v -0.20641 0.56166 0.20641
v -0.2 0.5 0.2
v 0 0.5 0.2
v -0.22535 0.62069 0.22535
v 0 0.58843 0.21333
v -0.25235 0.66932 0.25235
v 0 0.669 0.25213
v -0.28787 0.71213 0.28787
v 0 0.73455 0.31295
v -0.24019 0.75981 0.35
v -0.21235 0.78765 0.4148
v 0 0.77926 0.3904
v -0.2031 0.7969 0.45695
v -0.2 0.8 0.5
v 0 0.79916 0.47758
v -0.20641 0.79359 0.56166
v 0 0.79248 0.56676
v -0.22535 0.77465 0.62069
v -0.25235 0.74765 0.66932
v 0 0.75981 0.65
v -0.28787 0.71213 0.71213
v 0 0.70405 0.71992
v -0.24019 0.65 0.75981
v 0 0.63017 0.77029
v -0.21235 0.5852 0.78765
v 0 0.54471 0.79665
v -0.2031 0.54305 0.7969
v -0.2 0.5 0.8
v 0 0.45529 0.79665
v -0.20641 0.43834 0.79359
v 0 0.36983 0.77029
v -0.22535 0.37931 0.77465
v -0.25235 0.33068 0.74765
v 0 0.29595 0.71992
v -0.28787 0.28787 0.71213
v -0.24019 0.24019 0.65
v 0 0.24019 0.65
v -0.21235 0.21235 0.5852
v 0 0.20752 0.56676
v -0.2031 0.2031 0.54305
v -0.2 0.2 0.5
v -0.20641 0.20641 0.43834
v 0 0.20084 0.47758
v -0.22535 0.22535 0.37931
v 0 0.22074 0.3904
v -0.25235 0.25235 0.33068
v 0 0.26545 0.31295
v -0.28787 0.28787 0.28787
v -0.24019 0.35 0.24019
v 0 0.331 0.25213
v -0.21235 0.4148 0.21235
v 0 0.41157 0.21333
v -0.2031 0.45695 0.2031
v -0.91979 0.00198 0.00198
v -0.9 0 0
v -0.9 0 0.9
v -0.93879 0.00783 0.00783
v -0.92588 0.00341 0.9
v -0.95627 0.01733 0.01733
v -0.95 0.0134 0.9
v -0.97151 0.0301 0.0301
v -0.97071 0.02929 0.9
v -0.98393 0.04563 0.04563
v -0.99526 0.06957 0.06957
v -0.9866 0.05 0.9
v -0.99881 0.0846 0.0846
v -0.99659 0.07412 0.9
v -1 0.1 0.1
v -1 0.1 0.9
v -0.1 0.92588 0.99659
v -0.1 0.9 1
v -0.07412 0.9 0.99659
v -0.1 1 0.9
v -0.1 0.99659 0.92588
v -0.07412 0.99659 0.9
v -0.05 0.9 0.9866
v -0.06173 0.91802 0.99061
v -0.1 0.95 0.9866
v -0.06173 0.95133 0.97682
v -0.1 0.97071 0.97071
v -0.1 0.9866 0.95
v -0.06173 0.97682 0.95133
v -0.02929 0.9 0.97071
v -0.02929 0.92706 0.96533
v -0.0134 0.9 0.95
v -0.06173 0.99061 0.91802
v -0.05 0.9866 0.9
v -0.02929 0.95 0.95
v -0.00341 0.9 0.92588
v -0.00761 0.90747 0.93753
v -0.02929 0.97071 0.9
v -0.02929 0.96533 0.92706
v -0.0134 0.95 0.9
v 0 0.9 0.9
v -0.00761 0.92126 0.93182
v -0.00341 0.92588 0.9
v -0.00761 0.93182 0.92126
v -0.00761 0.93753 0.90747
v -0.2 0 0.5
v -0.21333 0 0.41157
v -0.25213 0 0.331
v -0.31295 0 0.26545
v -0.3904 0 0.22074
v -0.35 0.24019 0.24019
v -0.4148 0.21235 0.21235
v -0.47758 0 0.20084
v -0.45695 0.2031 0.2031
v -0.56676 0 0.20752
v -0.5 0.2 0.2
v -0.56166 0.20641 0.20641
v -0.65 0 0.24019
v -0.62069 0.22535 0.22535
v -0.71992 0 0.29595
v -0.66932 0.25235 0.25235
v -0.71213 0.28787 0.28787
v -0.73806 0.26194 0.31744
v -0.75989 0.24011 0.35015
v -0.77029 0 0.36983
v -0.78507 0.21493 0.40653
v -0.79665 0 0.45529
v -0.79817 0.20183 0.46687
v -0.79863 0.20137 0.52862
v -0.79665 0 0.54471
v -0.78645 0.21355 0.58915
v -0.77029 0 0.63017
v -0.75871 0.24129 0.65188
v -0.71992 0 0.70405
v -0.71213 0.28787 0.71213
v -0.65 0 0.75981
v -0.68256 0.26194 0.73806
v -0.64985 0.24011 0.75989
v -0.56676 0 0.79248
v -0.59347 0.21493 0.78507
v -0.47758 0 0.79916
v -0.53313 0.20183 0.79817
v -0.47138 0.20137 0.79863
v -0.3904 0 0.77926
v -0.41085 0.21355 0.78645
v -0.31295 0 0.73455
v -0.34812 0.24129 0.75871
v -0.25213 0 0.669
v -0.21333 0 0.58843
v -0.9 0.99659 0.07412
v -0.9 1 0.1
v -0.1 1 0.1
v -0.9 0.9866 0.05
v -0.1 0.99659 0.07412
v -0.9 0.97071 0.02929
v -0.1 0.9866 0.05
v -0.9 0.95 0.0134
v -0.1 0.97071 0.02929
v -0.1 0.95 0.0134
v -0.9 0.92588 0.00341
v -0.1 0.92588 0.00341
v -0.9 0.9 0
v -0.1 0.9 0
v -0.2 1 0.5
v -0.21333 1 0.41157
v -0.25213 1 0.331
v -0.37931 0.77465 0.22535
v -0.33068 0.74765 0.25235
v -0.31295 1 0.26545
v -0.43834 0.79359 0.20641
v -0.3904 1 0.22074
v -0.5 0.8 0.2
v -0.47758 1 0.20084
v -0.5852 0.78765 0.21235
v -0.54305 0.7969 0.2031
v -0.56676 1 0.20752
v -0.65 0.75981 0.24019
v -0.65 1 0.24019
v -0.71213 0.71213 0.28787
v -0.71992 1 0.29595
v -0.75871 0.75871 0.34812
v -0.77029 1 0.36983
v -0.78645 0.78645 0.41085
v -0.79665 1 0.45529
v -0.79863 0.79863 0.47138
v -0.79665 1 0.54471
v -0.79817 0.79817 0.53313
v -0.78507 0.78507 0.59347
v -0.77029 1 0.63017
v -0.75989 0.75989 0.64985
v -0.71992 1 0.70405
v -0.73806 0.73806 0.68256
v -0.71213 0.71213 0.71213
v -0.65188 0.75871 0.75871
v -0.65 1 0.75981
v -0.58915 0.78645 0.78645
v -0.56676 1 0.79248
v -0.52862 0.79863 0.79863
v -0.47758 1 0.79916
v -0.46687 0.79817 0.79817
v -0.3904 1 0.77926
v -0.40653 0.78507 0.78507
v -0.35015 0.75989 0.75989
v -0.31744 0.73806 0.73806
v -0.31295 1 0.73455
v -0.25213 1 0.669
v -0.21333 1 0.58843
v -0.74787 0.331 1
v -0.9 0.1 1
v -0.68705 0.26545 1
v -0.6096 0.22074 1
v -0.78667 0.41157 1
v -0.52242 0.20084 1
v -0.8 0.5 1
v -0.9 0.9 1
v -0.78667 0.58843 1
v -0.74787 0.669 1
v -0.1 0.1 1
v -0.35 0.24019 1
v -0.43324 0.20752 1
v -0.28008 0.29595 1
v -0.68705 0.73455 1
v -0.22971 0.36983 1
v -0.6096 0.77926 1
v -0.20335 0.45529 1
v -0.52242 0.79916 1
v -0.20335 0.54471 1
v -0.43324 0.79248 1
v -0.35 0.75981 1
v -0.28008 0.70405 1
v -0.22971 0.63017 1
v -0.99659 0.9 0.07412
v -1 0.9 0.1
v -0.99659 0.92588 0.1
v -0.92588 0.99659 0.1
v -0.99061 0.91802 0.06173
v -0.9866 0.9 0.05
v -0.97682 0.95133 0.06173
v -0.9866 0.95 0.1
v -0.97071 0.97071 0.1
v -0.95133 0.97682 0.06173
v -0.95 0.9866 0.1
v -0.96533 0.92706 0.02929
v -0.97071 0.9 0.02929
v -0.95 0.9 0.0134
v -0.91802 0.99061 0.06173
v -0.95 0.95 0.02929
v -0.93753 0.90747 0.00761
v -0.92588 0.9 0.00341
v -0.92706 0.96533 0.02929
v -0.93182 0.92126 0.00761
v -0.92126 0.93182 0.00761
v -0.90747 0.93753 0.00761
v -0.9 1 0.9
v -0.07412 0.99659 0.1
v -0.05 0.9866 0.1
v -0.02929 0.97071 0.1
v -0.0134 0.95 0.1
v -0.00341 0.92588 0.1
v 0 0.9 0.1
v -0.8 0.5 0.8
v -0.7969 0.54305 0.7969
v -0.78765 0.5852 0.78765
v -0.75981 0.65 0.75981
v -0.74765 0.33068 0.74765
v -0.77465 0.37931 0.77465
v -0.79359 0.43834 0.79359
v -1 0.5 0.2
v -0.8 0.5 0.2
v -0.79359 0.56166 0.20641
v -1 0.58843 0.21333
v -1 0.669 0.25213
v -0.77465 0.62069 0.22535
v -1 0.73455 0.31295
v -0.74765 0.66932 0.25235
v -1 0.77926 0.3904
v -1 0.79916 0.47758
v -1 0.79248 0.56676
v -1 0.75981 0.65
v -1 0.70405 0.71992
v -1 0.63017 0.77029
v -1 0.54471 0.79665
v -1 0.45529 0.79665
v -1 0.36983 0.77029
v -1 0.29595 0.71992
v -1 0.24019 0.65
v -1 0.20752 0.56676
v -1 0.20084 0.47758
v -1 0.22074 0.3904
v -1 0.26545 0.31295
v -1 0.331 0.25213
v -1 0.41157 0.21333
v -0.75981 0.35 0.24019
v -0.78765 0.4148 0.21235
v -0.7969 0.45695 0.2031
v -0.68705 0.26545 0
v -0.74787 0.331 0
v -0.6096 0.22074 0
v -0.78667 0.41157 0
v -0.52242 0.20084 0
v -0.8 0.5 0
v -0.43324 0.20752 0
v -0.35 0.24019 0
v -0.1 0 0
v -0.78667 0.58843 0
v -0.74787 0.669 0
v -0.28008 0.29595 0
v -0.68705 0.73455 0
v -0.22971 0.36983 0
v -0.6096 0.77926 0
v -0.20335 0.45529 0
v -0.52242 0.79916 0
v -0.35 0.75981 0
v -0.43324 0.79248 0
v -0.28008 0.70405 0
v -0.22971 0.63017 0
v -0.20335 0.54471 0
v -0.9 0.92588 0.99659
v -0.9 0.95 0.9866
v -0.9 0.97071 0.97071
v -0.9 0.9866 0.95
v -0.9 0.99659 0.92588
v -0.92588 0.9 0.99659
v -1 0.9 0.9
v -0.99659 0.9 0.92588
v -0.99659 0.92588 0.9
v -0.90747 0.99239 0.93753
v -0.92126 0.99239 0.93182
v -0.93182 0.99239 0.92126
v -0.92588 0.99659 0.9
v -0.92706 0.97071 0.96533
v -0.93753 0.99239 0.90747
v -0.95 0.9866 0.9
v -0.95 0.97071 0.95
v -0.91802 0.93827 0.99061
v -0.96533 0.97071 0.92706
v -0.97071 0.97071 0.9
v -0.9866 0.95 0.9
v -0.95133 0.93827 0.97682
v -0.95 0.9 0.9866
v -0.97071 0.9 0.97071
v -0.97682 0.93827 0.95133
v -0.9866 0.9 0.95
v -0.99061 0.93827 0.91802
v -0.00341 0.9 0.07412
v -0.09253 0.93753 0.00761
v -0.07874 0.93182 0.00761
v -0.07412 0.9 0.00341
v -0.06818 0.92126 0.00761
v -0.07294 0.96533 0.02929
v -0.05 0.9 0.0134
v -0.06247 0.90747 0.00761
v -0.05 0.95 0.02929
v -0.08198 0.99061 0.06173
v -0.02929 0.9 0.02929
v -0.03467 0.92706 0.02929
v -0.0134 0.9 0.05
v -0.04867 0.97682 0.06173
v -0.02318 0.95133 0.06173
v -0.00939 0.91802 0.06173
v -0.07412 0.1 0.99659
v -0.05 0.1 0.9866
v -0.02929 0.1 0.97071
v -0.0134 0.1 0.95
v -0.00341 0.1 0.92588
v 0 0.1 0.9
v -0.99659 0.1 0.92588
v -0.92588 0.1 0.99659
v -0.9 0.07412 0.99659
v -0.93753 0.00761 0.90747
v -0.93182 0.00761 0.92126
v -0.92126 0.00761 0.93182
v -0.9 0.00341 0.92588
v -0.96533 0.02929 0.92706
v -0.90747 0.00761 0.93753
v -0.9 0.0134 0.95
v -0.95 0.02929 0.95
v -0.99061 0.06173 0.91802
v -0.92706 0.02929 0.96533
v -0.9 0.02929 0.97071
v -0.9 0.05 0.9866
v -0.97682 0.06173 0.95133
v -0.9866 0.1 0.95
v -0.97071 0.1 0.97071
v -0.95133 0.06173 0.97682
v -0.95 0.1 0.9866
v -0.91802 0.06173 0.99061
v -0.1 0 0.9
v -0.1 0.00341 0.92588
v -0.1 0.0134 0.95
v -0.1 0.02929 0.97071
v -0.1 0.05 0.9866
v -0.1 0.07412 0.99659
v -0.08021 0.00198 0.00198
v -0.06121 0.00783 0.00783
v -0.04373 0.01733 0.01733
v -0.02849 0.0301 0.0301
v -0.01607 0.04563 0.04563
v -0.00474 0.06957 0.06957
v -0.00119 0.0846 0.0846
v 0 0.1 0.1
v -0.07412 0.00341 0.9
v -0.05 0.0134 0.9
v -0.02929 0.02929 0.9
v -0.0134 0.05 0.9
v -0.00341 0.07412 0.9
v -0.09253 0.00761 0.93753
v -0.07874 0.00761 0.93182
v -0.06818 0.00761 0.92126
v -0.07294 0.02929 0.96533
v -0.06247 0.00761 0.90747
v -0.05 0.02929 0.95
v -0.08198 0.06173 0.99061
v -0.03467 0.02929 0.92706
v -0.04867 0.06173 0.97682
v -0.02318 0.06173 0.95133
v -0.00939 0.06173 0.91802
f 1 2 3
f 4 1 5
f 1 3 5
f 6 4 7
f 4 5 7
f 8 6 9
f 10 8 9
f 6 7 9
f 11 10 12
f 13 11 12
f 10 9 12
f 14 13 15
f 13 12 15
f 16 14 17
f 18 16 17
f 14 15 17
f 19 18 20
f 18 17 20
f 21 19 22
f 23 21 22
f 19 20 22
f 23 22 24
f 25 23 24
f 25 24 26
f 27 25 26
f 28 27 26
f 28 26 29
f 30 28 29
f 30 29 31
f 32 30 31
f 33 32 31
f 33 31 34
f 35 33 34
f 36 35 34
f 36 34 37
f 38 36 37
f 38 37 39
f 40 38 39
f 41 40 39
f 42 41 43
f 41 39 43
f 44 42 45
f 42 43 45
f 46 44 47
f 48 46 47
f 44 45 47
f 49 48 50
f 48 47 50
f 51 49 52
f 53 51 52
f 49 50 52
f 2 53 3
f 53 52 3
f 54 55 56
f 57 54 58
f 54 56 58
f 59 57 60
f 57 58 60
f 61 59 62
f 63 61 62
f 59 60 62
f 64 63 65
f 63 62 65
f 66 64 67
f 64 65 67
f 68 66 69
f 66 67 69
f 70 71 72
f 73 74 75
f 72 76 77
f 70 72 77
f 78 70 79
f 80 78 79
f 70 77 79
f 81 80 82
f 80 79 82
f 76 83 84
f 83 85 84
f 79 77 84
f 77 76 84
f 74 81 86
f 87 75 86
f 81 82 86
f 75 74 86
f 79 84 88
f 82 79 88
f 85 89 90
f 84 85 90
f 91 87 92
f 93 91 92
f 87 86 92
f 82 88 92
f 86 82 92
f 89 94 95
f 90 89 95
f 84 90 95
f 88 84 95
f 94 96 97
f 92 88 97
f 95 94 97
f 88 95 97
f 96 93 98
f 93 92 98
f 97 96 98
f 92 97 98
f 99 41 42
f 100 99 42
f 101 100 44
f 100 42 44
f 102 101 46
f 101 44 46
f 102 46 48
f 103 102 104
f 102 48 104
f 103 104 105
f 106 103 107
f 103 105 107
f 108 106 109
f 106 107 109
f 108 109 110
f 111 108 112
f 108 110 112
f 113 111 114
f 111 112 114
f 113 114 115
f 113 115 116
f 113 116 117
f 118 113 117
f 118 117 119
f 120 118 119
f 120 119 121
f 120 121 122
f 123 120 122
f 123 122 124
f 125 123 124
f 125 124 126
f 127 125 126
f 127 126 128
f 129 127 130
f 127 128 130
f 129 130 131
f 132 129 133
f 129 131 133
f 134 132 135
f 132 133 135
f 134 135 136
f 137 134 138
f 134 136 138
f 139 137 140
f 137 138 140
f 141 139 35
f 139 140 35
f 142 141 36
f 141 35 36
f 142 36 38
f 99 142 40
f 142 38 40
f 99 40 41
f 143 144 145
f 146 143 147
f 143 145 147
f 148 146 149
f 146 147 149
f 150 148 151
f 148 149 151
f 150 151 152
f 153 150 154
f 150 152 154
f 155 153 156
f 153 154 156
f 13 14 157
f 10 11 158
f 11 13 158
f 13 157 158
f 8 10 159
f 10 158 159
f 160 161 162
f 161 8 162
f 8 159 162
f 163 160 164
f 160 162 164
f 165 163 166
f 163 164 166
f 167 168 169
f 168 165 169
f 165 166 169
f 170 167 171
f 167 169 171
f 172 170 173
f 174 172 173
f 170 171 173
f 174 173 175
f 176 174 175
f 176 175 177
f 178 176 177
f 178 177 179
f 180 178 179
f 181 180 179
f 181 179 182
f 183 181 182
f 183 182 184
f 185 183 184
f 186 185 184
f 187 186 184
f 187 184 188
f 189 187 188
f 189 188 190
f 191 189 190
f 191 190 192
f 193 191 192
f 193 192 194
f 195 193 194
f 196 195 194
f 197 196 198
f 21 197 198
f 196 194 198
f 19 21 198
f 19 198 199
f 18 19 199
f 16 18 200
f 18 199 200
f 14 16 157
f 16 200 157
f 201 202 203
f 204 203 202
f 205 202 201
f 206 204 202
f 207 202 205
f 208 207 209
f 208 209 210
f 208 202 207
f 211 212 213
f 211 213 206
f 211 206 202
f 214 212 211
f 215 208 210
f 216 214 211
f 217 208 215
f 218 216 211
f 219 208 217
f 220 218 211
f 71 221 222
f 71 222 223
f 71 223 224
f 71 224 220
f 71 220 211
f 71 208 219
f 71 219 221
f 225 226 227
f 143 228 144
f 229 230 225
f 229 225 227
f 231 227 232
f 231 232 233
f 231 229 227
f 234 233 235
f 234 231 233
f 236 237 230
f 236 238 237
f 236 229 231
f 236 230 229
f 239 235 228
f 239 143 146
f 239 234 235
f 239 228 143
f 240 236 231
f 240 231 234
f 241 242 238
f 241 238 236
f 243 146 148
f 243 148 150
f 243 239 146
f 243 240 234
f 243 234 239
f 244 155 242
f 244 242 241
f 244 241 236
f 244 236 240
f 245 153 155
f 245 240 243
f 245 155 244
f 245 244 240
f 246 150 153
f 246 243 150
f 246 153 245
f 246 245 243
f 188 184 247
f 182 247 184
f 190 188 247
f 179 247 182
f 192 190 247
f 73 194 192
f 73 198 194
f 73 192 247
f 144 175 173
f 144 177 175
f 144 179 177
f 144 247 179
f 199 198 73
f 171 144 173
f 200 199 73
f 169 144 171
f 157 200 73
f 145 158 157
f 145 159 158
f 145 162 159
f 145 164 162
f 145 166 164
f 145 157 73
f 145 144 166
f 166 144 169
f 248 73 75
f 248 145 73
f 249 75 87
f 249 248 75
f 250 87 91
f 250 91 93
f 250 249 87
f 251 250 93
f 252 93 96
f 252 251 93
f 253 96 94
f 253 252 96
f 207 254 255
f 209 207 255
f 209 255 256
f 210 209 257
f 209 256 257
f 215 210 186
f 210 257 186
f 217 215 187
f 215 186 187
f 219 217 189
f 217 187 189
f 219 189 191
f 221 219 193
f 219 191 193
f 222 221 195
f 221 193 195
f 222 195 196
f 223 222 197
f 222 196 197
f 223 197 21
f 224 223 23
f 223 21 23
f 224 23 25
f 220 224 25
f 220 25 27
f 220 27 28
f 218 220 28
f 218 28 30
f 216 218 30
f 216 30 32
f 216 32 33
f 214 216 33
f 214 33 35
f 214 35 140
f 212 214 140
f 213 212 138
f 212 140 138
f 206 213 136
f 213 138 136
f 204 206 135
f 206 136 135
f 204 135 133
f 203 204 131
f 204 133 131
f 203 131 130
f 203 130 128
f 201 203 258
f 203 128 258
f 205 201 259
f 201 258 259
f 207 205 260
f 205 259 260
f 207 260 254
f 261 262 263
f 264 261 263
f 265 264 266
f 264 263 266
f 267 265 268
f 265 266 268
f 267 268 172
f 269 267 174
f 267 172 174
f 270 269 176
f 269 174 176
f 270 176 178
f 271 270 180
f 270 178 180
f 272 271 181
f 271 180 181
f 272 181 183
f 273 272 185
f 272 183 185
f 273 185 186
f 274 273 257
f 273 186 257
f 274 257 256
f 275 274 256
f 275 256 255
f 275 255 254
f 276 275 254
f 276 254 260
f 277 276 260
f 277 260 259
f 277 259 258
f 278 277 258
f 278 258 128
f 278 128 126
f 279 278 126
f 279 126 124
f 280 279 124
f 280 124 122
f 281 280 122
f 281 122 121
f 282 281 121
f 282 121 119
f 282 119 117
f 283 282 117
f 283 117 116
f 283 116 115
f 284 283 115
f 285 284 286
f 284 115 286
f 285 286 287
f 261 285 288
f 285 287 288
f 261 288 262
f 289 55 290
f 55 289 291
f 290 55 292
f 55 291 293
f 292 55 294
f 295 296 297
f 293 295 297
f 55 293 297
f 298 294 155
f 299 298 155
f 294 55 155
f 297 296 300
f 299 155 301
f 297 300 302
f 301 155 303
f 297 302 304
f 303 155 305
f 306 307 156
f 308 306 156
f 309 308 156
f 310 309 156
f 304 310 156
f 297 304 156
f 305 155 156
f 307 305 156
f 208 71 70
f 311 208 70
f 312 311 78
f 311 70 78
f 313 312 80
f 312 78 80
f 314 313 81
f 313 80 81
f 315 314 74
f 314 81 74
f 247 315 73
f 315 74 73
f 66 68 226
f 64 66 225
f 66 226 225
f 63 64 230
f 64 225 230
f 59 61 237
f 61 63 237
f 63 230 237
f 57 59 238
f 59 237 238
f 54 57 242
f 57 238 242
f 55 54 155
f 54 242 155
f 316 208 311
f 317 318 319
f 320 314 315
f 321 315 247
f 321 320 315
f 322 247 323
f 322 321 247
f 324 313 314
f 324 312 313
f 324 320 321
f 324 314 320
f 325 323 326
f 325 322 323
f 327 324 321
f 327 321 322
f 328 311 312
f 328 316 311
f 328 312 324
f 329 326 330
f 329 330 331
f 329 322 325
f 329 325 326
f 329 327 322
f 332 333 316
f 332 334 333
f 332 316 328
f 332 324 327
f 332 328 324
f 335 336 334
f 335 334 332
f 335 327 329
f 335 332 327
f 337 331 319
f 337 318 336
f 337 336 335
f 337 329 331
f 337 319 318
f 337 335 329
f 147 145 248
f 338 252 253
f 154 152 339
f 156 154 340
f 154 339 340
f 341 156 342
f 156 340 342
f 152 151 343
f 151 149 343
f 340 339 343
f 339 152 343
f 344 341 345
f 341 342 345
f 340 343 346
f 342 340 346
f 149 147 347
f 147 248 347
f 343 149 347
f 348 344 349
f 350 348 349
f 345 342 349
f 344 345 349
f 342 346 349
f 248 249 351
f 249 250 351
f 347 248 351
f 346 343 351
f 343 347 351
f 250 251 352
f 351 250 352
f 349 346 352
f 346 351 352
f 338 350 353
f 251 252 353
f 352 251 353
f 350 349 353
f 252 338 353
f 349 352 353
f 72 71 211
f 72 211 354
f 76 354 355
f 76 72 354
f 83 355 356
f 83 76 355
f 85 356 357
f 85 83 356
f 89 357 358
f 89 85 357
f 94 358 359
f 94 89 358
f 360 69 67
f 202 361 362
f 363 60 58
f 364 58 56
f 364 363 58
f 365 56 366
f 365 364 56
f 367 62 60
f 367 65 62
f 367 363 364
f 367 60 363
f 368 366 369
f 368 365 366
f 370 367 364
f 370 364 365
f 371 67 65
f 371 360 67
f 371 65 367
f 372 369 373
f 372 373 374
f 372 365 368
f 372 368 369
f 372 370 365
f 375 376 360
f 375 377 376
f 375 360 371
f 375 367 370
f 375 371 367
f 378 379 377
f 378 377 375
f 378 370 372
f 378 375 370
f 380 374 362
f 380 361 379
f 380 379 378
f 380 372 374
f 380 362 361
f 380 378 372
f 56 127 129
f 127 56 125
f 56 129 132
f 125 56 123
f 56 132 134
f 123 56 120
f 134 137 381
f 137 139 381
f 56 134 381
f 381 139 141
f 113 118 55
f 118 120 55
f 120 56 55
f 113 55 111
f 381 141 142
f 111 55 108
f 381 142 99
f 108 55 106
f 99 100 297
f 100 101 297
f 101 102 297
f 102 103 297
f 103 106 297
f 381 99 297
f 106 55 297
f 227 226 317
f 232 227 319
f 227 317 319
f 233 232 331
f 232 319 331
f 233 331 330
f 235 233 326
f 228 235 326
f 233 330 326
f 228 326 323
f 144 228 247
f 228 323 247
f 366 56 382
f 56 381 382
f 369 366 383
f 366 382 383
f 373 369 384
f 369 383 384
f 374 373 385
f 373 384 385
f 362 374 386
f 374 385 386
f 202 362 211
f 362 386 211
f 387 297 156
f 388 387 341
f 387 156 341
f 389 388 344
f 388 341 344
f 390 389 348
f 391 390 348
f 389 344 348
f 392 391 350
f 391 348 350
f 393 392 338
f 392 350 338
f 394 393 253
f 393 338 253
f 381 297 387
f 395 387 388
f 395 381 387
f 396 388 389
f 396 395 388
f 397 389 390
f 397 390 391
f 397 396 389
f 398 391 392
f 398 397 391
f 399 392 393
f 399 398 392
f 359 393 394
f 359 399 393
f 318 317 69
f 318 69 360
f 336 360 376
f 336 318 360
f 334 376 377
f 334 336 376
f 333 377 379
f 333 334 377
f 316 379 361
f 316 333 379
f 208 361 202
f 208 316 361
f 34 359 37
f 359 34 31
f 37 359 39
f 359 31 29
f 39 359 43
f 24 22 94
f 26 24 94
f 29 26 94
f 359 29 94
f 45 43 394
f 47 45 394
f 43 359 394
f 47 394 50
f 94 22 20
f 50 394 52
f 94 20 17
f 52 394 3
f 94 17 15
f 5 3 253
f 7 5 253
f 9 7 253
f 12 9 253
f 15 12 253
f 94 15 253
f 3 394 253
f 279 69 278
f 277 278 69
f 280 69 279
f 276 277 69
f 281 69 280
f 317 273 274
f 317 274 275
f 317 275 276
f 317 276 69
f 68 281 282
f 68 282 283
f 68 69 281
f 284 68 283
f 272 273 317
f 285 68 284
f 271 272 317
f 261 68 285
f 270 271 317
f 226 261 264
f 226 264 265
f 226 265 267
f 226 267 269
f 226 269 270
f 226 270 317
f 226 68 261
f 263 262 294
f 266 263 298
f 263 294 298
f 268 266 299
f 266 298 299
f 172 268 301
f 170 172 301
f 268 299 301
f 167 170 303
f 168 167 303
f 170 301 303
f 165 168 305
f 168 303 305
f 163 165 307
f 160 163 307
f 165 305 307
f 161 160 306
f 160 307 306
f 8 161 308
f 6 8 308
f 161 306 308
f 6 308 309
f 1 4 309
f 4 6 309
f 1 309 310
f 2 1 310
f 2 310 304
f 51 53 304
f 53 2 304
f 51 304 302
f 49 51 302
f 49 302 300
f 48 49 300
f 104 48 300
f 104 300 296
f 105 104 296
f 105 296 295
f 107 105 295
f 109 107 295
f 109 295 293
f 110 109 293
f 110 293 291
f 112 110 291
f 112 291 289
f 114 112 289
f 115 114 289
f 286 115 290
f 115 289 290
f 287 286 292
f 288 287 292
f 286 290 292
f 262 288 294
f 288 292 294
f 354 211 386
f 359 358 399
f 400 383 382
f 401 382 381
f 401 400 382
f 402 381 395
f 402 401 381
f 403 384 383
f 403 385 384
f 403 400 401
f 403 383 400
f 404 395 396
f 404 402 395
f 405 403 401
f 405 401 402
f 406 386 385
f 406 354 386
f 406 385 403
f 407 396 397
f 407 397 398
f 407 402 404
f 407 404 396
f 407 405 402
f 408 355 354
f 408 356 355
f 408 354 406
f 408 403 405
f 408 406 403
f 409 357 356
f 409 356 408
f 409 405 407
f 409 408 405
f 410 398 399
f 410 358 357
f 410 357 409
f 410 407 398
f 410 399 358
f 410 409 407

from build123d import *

# Parameters (mm, degrees)
ESQUISSE1_W             = 1
ESQUISSE1_H             = 1
BOSS_EXTRU_1_DEPTH      = 1
ESQUISSE2_R             = 0.3
ENL_V_MAT_EXTRU_1_DEPTH = 1
ESQUISSE4_R             = 0.3
ENL_V_MAT_EXTRU_2_DEPTH = 1
ESQUISSE3_R             = 0.3
ENL_V_MAT_EXTRU_3_DEPTH = 1
CONG_2_R                = 0.1
CONG_3_R                = 0.1


with BuildPart() as part:
    # Esquisse1 → Boss.-Extru.1 (new body)
    with BuildSketch(Plane.XY):
        with Locations((-0.5, 0.5)):
            Rectangle(ESQUISSE1_W, ESQUISSE1_H)
    extrude(amount=BOSS_EXTRU_1_DEPTH)

    # Esquisse2 → Enlèv. mat.-Extru.1 (cut)
    with BuildSketch(Plane(origin=(0, 0, 0), x_dir=(0, 0, -1), z_dir=(1, 0, 0))):
        with Locations((-0.5, 0.5)):
            Circle(ESQUISSE2_R)
    extrude(amount=-ENL_V_MAT_EXTRU_1_DEPTH, mode=Mode.SUBTRACT)

    # Esquisse4 → Enlèv. mat.-Extru.2 (cut)
    with BuildSketch(Plane(origin=(0, 0, 0), x_dir=(-1, 0, 0), z_dir=(0, 0, -1))):
        with Locations((0.5, 0.5)):
            Circle(ESQUISSE4_R)
    extrude(amount=-ENL_V_MAT_EXTRU_2_DEPTH, mode=Mode.SUBTRACT)

    # Esquisse3 → Enlèv. mat.-Extru.3 (cut)
    with BuildSketch(Plane(origin=(0, 1, 0), x_dir=(1, 0, 0), z_dir=(0, 1, 0))):
        with Locations((-0.5, -0.5)):
            Circle(ESQUISSE3_R)
    extrude(amount=-ENL_V_MAT_EXTRU_3_DEPTH, mode=Mode.SUBTRACT)

    # Congé2
    cong_2_edges = [part.edges().sort_by_distance(p)[0] for p in [
        (-1, 0.5, 1),
        (-0.5, 1, 1),
        (-1, 1, 0.5),
    ]]
    fillet(cong_2_edges, radius=CONG_2_R)

    # Congé3
    cong_3_edges = [part.edges().sort_by_distance(p)[0] for p in [
        (0, 0.45, 1),
        (-0.45, 0, 1),
        (0, 1, 0.45),
        (0, 0.970710678, 0.970710678),
        (-1, 0, 0.45),
        (-0.970710678, 0, 0.970710678),
        (-1, 0.45, 0),
        (-0.970710678, 0.970710678, 0),
        (-0.45, 1, 0),
        (0, 0.5, 0),
        (0, 0, 0.5),
    ]]
    fillet(cong_3_edges, radius=CONG_3_R)


solid = part.part
